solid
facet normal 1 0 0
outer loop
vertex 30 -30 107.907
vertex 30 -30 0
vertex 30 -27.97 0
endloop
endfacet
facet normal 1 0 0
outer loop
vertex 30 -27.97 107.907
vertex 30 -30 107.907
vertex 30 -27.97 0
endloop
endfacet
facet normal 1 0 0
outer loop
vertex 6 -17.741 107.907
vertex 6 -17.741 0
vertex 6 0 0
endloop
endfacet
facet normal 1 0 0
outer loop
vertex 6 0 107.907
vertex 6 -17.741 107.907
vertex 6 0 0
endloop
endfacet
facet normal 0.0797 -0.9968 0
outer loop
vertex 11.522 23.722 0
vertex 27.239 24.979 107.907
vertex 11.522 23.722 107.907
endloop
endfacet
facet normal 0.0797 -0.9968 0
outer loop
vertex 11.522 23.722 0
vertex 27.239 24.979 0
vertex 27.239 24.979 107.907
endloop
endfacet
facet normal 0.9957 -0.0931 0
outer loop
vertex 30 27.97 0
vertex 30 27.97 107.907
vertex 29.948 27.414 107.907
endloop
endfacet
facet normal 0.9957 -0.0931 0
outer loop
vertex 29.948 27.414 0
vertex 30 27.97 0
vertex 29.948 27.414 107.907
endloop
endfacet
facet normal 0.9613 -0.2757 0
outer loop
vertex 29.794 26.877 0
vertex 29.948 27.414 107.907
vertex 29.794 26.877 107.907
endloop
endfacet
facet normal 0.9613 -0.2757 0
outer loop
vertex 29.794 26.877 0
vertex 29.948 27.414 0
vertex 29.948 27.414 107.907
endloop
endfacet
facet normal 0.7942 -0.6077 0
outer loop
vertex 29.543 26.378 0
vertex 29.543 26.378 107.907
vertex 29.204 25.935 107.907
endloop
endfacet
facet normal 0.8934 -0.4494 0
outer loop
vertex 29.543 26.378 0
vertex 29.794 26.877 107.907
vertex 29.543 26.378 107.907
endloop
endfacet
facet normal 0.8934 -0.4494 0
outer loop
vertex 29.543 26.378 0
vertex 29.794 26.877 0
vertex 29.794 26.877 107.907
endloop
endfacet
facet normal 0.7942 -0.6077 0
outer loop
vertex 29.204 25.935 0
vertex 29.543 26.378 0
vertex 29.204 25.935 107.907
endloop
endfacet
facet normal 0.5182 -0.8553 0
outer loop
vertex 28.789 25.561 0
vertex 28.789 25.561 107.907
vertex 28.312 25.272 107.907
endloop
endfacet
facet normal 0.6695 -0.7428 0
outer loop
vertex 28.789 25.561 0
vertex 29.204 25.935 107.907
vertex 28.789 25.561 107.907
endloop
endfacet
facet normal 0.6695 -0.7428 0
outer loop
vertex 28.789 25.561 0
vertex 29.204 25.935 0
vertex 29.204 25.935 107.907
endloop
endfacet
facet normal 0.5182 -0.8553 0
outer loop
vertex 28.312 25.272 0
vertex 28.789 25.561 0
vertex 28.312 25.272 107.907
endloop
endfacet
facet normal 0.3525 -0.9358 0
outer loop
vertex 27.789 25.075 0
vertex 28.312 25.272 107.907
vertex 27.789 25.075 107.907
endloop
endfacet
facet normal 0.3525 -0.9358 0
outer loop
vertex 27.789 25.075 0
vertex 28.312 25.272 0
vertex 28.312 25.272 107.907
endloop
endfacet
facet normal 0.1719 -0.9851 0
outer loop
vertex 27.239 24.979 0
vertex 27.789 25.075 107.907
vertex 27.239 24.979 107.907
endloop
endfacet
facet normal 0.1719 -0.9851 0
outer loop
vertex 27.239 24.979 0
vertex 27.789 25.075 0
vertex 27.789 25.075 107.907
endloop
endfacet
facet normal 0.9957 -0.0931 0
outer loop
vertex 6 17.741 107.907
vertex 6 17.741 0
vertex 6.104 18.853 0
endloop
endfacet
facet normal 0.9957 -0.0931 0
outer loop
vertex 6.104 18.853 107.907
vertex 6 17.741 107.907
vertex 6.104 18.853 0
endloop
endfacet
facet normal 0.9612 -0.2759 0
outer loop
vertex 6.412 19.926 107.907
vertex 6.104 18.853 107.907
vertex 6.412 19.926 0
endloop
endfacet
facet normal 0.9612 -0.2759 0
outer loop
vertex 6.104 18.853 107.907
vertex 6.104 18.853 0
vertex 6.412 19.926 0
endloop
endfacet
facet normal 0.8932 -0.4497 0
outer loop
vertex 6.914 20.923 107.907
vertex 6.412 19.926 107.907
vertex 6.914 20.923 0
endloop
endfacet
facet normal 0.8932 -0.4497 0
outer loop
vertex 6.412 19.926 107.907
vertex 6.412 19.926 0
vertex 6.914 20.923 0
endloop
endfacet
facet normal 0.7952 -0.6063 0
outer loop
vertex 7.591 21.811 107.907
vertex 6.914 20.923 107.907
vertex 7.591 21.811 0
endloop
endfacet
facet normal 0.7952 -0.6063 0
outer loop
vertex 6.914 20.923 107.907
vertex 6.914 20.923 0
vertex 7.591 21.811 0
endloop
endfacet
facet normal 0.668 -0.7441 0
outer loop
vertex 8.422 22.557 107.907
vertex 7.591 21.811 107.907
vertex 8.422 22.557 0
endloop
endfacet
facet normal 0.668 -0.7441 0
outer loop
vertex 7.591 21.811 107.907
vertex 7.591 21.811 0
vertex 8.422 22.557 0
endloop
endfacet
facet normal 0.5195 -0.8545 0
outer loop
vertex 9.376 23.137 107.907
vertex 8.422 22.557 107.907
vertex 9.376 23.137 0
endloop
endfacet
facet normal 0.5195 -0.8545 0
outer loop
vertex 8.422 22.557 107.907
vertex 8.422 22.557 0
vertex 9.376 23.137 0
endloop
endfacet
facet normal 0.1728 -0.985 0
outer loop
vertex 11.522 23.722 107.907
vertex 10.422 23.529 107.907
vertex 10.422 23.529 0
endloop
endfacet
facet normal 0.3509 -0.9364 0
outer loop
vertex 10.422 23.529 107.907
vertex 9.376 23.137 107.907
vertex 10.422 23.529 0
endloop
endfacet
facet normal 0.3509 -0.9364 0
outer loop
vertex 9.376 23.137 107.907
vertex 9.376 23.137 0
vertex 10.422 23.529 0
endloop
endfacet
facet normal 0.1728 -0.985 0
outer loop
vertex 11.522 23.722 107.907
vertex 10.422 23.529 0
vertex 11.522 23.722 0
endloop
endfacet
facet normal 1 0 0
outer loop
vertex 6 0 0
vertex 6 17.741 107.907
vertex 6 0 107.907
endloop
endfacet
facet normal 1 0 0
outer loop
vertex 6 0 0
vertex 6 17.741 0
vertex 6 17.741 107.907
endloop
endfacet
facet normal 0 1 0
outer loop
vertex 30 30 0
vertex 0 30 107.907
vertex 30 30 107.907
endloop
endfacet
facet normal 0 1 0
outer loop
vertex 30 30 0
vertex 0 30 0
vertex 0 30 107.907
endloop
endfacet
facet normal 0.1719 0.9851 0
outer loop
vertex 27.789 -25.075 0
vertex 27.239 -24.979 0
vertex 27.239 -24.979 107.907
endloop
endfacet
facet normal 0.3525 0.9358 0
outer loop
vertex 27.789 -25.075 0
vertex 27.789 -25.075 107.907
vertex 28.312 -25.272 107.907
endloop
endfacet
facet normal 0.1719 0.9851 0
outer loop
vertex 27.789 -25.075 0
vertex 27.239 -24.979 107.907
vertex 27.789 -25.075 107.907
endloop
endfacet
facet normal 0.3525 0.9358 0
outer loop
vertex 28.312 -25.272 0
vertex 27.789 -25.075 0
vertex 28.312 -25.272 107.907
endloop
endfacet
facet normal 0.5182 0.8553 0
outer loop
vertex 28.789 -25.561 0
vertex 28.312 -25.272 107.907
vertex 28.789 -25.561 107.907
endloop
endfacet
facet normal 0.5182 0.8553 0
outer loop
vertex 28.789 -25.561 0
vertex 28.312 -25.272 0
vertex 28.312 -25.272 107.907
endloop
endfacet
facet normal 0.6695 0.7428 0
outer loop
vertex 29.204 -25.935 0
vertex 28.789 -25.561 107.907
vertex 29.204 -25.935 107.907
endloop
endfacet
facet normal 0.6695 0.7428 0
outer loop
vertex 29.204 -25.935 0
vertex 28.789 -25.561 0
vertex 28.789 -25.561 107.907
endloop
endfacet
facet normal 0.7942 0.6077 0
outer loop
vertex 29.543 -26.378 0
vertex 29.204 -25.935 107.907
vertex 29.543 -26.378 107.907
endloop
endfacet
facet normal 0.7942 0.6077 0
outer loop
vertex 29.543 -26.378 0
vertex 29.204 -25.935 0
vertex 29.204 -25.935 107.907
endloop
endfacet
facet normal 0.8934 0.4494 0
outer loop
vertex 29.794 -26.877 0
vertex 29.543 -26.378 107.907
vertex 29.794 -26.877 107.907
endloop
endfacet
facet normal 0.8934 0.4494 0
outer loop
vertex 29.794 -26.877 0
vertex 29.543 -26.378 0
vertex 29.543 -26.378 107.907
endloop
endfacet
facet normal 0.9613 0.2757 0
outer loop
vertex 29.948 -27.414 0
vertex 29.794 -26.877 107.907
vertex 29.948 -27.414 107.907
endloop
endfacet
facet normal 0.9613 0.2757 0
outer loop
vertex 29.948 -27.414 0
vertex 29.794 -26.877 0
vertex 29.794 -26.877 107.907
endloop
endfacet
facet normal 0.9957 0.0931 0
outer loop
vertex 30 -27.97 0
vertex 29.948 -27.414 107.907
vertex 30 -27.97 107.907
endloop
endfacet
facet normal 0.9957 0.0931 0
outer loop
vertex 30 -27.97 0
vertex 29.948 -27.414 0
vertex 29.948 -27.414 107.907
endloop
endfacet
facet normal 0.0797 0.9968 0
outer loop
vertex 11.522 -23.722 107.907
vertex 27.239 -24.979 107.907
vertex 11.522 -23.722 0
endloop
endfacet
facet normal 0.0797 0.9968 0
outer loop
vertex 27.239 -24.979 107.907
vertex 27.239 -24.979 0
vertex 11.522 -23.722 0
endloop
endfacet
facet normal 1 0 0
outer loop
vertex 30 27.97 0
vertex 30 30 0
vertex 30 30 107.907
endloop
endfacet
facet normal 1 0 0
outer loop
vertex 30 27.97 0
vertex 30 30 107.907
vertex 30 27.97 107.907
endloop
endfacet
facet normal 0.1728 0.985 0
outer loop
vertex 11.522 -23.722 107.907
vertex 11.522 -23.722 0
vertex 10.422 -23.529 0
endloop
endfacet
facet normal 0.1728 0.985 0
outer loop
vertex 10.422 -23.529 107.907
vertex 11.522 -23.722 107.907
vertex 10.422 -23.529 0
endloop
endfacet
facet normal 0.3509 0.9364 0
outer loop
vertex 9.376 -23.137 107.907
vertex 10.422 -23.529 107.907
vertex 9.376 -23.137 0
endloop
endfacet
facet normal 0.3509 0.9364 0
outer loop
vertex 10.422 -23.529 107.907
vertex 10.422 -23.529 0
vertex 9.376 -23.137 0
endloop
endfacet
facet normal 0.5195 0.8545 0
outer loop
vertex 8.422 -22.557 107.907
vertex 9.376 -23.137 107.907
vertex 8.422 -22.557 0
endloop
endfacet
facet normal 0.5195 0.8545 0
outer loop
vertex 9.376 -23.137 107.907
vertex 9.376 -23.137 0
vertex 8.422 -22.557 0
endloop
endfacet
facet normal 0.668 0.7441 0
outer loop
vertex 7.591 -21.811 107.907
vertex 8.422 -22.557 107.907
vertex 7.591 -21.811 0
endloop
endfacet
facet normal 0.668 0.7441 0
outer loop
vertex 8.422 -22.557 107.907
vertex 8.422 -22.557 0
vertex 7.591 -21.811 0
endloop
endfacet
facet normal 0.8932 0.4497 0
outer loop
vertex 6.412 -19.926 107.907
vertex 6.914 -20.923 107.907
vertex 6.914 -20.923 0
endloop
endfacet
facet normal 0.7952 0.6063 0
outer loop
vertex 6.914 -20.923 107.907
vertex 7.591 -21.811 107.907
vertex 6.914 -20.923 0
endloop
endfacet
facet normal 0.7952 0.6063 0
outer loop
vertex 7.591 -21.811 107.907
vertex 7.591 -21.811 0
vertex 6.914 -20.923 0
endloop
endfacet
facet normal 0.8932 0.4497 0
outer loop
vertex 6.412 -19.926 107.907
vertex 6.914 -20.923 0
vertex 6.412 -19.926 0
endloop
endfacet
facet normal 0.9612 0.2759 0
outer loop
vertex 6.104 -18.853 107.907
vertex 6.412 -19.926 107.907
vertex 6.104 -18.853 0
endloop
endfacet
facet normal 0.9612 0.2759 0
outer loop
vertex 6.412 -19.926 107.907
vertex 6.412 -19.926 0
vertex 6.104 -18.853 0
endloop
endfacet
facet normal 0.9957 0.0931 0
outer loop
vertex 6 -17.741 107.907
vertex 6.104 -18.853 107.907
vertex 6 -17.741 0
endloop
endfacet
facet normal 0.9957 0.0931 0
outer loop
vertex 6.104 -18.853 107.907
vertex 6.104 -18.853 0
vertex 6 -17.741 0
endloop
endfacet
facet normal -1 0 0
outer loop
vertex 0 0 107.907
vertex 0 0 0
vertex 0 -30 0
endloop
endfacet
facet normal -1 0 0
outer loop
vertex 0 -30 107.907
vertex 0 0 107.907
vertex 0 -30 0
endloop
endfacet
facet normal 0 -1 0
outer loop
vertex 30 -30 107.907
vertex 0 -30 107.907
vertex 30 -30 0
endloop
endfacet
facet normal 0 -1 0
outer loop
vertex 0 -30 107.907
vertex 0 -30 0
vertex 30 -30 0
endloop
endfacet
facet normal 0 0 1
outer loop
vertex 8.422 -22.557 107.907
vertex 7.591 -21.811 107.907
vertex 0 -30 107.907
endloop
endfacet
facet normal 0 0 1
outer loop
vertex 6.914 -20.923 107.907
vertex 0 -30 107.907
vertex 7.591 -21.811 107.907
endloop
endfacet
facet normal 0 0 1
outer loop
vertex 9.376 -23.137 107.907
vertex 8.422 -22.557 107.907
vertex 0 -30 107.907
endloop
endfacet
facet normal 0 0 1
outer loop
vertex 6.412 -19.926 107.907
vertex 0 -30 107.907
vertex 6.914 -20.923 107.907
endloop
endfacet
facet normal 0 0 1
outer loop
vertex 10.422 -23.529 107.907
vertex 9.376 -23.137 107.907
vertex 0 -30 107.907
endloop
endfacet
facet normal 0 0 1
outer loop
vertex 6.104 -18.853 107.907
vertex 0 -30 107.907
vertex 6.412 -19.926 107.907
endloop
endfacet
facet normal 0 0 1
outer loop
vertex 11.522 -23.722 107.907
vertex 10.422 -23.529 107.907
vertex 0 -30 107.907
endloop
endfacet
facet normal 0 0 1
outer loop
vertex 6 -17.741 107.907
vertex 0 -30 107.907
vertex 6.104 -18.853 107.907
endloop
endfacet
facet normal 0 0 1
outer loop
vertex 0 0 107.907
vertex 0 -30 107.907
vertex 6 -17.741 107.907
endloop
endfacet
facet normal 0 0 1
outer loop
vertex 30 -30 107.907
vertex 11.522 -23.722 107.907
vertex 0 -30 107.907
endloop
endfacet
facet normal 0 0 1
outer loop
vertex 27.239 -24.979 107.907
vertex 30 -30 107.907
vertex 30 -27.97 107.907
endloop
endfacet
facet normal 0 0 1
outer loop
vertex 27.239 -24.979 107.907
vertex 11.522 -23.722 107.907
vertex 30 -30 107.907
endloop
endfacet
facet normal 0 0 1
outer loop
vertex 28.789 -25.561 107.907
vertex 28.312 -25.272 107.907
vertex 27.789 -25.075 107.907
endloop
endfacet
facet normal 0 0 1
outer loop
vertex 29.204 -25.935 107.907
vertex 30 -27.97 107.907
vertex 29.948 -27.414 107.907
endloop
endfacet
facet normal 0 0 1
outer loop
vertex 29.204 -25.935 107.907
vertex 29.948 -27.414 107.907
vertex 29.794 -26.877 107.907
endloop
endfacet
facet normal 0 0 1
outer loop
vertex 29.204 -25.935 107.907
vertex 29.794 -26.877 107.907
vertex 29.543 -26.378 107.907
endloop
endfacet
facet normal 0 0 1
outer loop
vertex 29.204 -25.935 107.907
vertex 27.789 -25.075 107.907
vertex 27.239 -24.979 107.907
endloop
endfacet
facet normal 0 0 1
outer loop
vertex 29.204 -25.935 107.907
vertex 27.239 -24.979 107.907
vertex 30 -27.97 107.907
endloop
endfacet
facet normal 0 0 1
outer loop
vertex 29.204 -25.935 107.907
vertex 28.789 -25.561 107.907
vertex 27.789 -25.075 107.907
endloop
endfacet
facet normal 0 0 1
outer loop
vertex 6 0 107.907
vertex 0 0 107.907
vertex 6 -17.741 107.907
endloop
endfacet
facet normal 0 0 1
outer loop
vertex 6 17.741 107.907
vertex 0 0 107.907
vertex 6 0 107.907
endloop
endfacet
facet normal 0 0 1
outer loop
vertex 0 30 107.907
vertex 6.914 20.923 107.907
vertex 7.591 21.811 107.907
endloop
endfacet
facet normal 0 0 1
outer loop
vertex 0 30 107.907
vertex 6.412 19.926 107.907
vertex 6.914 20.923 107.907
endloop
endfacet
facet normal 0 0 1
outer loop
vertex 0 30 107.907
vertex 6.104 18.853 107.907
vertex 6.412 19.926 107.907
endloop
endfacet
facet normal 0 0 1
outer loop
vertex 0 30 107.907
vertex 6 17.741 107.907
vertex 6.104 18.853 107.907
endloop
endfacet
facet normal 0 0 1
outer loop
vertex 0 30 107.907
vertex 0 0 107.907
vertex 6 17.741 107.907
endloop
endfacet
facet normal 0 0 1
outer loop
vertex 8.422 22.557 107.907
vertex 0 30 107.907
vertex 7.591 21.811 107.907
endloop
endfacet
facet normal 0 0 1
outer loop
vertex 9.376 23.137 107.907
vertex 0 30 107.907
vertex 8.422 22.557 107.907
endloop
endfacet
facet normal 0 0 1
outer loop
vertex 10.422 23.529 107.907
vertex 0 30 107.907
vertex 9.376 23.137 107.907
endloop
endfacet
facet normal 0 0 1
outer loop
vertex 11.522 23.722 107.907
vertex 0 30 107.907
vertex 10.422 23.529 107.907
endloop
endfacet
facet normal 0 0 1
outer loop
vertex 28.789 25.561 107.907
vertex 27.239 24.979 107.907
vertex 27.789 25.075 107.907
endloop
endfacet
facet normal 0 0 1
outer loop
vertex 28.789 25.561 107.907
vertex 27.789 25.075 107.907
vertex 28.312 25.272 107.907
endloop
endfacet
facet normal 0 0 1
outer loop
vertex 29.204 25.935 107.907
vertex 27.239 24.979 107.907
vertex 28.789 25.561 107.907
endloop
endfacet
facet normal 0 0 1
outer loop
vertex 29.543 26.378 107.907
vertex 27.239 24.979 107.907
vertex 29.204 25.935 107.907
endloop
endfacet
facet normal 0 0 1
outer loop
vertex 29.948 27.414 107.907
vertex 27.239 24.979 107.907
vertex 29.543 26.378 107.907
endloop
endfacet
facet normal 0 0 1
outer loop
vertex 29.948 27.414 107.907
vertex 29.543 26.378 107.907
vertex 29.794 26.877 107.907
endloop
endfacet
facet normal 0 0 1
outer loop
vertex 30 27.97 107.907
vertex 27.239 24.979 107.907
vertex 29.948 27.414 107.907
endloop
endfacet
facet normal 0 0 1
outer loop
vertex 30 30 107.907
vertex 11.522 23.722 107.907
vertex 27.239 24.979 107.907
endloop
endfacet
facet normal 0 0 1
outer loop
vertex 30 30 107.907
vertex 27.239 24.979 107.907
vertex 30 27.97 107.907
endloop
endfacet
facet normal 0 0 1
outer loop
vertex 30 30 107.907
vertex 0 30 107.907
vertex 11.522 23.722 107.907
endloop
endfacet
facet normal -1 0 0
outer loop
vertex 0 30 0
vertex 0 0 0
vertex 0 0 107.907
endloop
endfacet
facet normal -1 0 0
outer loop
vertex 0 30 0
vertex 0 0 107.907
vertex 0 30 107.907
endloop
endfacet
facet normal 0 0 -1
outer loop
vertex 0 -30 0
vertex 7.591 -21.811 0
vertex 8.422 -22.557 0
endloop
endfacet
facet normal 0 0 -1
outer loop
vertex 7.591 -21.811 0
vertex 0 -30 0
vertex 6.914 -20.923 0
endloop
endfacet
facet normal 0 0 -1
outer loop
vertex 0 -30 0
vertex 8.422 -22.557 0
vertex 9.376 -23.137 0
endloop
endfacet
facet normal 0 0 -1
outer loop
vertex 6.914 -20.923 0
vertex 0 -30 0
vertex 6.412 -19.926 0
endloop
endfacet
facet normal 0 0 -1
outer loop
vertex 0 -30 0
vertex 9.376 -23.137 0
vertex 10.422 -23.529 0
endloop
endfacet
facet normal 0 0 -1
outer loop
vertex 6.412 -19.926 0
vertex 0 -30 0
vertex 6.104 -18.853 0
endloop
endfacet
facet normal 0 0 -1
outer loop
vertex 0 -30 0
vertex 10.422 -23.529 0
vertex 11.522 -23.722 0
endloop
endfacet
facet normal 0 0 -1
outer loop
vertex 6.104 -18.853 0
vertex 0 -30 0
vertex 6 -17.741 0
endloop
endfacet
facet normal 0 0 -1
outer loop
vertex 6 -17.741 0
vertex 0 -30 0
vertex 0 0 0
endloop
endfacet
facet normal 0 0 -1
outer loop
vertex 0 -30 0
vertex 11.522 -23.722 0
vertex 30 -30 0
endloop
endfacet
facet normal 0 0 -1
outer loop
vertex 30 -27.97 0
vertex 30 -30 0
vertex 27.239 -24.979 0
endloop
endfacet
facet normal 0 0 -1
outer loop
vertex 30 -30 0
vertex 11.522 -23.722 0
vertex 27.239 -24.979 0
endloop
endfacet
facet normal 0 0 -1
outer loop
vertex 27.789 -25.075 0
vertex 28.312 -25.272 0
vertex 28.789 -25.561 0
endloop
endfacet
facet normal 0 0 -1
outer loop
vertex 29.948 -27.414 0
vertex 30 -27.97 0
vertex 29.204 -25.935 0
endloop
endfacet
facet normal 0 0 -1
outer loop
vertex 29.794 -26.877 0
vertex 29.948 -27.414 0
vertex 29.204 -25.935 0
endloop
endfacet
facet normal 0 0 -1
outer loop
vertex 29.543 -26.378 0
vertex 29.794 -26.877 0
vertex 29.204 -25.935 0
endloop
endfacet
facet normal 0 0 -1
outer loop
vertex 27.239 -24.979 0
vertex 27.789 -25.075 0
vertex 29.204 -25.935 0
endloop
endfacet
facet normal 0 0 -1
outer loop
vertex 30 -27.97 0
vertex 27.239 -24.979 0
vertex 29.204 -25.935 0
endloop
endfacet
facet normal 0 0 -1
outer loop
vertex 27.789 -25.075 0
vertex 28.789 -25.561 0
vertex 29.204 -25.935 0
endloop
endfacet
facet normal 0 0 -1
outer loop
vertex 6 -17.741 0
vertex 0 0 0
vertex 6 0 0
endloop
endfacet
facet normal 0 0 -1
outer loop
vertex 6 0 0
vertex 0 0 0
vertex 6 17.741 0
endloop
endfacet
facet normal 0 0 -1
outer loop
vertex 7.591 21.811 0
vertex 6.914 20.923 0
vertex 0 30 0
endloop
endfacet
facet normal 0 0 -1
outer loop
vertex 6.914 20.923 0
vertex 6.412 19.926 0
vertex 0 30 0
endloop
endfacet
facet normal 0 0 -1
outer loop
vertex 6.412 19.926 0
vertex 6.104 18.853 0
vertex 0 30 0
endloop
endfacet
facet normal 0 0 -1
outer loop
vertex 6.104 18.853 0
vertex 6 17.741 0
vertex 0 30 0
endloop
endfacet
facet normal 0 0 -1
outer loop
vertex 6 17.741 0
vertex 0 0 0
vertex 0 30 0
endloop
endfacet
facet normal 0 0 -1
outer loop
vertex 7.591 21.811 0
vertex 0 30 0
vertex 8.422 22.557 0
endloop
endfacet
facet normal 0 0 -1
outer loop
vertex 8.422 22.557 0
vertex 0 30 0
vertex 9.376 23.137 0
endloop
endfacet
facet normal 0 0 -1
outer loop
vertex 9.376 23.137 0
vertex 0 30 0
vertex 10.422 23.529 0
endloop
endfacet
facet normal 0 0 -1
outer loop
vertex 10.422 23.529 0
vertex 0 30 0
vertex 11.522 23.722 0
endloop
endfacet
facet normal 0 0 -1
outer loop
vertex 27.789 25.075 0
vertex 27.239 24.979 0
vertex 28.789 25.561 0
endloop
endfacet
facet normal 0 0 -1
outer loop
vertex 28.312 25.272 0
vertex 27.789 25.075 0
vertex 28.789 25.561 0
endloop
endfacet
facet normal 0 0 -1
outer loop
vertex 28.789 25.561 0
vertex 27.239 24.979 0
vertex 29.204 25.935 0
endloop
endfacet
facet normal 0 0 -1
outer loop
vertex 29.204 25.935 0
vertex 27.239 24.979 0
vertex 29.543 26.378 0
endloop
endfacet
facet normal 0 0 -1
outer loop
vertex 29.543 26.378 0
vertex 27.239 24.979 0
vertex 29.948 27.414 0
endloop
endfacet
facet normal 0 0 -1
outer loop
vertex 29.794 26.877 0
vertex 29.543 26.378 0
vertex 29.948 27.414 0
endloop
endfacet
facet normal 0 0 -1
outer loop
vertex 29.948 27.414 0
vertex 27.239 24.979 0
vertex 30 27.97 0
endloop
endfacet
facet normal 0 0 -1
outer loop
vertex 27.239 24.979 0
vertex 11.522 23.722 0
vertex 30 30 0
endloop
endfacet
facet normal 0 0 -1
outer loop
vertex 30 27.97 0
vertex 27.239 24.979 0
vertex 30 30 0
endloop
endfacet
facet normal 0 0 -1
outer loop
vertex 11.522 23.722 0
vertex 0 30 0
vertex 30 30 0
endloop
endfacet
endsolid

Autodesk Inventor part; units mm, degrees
ref_plane "YZ Plane" through (0, 0, 0) normal (1, 0, 0) x (0, 1, 0)
ref_plane "Start plane" through (0, 0, 0) normal (0, 0, 1) x (1, 0, 0)
ref_plane "End plane" through (0, 0, 107.9074) normal (0, 0, 1) x (1, 0, 0)
sketch "Sketch" plane through (0, 0, 0) normal (0, 0, 1) x (1, 0, 0)
  line L0 (0, 0) -> (0, 30)
  line L1 (0, 30) -> (30, 30)
  line L2 (30, 30) -> (30, 27.9696)
  line L3 (27.2392, 24.9791) -> (11.5215, 23.7217)
  line L4 (6, 17.7408) -> (6, 0)
  line L5 (6, 0) -> (0, 0) construction
  line L6 (15, 30) -> (15, 24) construction
  line L7 (30, 25.2) -> (30, 24) construction
  line L8 (30, 24) -> (15, 24) construction
  line L9 (0, 15) -> (0, -27) construction
  line L10 (-5.539, 0) -> (16.0067, 0) construction
  line L11 (0, 0) -> (0, -30)
  line L12 (0, -30) -> (30, -30)
  line L13 (30, -30) -> (30, -27.9696)
  line L14 (27.2392, -24.9791) -> (11.5215, -23.7217)
  line L15 (6, -17.7408) -> (6, 0)
  arc A0 (11.5215, 23.7217) -> (6, 17.7408) centre (12, 17.7408) ccw
  arc A1 (6, -17.7408) -> (11.5215, -23.7217) centre (12, -17.7408) ccw
  arc A2 (27.2392, 24.9791) -> (30, 27.9696) centre (27, 27.9696) ccw
  arc A3 (30, -27.9696) -> (27.2392, -24.9791) centre (27, -27.9696) ccw
  line L16 (0, 42) -> (0, -42) construction
  line L17 (-12.7637, 0) -> (37.8094, 0) construction
  point P0 (6, 23.28)
  point P1 (30, -25.2)
  point P2 (6, -23.28)
  point P3 (15, -30)
  point P4 (15, -24)
  dimension "d0" = 6
  dimension "d1" = 30
  dimension "d2" = 30
  dimension "d3" = 6
  dimension "d4" = 15
  dimension "d5" = 1.2
  dimension "d23" = 6
  dimension "d24" = 3
  dimension "d25" = 0
extrude "Body" add sketch "Sketch" along normal up to surface (107.9074 mm away) from surface at 0
sketch "Sketch3" plane through (0, 0, 0) normal (0, 0, 1) x (1, 0, 0)
  line L0 (0, 0) -> (10, 0)
ref_plane "Work Plane3" through (0, 0, 0) normal (0, -1, 0) x (1, 0, 0)
sketch "Sketch4" plane through (0, 0, 0) normal (0, -1, 0) x (1, 0, 0)
  line L0 (-2, 0) -> (12, 0)
  line L1 (-2, 107.9074) -> (12, 107.9074)
  dimension "d29" = 107.9074
sketch "Sketch5" plane through (0, 30, 107.9074) normal (0, 0, 1) x (1, 0, 0)
  line L0 (0, -30) -> (68.087, -30)
  circle A0 centre (31, -30) radius 25
  line L1 (31, -30) -> (31, 0.1301)
  line L2 (0, -60) -> (0, 0) projected
  line L3 (6, -12.2592) -> (6, -47.7408) projected
  arc A1 (27.2392, -5.0209) -> (30, -2.0304) centre (27, -2.0304) ccw projected
  line L4 (-62.4974, -26.9061) -> (-61.0279, -26.9061)
  line L5 (27.2392, -5.0209) -> (27.2392, 0)
  line L6 (0, 0) -> (30, 0) projected
  line L7 (27.2392, -5.0209) -> (11.5215, -6.2783) projected
  point P0 (-64.1158, -8.8185)
  point P1 (-63.0266, -8.8185)
  dimension "d30" = 50
  dimension "d32" = 6
  dimension "d33" = 27.9696
  dimension "d34" = 3
  dimension "d35" = 1.4696
  dimension "d36" = 3.7608
  dimension "d37" = 1.0892
  dimension "d38" = 30
  dimension "d39" = 31
  dimension "d41" = 5.0209
equation "\"d0\" = G_T"
equation "\"d1\" = 0.5 * G_H"
equation "\"d2\" = G_W"
equation "\"d3\" = G_T1"
equation "\"d4\" = G_C"
equation "\"d23\" = G_IR"
equation "\"d24\" = G_ER"
equation "\"d6\" = G_L"
equation "\"G_W\" = 30"
equation "\"G_H\" = 60"
equation "\"G_T\" = 6"
equation "\"G_T1\" = 6"
equation "\"G_NG\" = 0.08"
equation "\"G_ER\" = 3"
equation "\"G_IR\" = 6"
equation "\"G_C\" = 15"
equation "\"G_L\" = d29"
equation "\"ex\" = 0"
equation "\"G_OFFSET_START\" = 0"
equation "\"G_OFFSET_END\" = 0"
equation "\"d27\" = G_OFFSET_END + B_L"
equation "\"B_L\" = 107.90737"
properties part number "DIN1026-1 - U 60 - 107.907" material "Steel, Mild"
